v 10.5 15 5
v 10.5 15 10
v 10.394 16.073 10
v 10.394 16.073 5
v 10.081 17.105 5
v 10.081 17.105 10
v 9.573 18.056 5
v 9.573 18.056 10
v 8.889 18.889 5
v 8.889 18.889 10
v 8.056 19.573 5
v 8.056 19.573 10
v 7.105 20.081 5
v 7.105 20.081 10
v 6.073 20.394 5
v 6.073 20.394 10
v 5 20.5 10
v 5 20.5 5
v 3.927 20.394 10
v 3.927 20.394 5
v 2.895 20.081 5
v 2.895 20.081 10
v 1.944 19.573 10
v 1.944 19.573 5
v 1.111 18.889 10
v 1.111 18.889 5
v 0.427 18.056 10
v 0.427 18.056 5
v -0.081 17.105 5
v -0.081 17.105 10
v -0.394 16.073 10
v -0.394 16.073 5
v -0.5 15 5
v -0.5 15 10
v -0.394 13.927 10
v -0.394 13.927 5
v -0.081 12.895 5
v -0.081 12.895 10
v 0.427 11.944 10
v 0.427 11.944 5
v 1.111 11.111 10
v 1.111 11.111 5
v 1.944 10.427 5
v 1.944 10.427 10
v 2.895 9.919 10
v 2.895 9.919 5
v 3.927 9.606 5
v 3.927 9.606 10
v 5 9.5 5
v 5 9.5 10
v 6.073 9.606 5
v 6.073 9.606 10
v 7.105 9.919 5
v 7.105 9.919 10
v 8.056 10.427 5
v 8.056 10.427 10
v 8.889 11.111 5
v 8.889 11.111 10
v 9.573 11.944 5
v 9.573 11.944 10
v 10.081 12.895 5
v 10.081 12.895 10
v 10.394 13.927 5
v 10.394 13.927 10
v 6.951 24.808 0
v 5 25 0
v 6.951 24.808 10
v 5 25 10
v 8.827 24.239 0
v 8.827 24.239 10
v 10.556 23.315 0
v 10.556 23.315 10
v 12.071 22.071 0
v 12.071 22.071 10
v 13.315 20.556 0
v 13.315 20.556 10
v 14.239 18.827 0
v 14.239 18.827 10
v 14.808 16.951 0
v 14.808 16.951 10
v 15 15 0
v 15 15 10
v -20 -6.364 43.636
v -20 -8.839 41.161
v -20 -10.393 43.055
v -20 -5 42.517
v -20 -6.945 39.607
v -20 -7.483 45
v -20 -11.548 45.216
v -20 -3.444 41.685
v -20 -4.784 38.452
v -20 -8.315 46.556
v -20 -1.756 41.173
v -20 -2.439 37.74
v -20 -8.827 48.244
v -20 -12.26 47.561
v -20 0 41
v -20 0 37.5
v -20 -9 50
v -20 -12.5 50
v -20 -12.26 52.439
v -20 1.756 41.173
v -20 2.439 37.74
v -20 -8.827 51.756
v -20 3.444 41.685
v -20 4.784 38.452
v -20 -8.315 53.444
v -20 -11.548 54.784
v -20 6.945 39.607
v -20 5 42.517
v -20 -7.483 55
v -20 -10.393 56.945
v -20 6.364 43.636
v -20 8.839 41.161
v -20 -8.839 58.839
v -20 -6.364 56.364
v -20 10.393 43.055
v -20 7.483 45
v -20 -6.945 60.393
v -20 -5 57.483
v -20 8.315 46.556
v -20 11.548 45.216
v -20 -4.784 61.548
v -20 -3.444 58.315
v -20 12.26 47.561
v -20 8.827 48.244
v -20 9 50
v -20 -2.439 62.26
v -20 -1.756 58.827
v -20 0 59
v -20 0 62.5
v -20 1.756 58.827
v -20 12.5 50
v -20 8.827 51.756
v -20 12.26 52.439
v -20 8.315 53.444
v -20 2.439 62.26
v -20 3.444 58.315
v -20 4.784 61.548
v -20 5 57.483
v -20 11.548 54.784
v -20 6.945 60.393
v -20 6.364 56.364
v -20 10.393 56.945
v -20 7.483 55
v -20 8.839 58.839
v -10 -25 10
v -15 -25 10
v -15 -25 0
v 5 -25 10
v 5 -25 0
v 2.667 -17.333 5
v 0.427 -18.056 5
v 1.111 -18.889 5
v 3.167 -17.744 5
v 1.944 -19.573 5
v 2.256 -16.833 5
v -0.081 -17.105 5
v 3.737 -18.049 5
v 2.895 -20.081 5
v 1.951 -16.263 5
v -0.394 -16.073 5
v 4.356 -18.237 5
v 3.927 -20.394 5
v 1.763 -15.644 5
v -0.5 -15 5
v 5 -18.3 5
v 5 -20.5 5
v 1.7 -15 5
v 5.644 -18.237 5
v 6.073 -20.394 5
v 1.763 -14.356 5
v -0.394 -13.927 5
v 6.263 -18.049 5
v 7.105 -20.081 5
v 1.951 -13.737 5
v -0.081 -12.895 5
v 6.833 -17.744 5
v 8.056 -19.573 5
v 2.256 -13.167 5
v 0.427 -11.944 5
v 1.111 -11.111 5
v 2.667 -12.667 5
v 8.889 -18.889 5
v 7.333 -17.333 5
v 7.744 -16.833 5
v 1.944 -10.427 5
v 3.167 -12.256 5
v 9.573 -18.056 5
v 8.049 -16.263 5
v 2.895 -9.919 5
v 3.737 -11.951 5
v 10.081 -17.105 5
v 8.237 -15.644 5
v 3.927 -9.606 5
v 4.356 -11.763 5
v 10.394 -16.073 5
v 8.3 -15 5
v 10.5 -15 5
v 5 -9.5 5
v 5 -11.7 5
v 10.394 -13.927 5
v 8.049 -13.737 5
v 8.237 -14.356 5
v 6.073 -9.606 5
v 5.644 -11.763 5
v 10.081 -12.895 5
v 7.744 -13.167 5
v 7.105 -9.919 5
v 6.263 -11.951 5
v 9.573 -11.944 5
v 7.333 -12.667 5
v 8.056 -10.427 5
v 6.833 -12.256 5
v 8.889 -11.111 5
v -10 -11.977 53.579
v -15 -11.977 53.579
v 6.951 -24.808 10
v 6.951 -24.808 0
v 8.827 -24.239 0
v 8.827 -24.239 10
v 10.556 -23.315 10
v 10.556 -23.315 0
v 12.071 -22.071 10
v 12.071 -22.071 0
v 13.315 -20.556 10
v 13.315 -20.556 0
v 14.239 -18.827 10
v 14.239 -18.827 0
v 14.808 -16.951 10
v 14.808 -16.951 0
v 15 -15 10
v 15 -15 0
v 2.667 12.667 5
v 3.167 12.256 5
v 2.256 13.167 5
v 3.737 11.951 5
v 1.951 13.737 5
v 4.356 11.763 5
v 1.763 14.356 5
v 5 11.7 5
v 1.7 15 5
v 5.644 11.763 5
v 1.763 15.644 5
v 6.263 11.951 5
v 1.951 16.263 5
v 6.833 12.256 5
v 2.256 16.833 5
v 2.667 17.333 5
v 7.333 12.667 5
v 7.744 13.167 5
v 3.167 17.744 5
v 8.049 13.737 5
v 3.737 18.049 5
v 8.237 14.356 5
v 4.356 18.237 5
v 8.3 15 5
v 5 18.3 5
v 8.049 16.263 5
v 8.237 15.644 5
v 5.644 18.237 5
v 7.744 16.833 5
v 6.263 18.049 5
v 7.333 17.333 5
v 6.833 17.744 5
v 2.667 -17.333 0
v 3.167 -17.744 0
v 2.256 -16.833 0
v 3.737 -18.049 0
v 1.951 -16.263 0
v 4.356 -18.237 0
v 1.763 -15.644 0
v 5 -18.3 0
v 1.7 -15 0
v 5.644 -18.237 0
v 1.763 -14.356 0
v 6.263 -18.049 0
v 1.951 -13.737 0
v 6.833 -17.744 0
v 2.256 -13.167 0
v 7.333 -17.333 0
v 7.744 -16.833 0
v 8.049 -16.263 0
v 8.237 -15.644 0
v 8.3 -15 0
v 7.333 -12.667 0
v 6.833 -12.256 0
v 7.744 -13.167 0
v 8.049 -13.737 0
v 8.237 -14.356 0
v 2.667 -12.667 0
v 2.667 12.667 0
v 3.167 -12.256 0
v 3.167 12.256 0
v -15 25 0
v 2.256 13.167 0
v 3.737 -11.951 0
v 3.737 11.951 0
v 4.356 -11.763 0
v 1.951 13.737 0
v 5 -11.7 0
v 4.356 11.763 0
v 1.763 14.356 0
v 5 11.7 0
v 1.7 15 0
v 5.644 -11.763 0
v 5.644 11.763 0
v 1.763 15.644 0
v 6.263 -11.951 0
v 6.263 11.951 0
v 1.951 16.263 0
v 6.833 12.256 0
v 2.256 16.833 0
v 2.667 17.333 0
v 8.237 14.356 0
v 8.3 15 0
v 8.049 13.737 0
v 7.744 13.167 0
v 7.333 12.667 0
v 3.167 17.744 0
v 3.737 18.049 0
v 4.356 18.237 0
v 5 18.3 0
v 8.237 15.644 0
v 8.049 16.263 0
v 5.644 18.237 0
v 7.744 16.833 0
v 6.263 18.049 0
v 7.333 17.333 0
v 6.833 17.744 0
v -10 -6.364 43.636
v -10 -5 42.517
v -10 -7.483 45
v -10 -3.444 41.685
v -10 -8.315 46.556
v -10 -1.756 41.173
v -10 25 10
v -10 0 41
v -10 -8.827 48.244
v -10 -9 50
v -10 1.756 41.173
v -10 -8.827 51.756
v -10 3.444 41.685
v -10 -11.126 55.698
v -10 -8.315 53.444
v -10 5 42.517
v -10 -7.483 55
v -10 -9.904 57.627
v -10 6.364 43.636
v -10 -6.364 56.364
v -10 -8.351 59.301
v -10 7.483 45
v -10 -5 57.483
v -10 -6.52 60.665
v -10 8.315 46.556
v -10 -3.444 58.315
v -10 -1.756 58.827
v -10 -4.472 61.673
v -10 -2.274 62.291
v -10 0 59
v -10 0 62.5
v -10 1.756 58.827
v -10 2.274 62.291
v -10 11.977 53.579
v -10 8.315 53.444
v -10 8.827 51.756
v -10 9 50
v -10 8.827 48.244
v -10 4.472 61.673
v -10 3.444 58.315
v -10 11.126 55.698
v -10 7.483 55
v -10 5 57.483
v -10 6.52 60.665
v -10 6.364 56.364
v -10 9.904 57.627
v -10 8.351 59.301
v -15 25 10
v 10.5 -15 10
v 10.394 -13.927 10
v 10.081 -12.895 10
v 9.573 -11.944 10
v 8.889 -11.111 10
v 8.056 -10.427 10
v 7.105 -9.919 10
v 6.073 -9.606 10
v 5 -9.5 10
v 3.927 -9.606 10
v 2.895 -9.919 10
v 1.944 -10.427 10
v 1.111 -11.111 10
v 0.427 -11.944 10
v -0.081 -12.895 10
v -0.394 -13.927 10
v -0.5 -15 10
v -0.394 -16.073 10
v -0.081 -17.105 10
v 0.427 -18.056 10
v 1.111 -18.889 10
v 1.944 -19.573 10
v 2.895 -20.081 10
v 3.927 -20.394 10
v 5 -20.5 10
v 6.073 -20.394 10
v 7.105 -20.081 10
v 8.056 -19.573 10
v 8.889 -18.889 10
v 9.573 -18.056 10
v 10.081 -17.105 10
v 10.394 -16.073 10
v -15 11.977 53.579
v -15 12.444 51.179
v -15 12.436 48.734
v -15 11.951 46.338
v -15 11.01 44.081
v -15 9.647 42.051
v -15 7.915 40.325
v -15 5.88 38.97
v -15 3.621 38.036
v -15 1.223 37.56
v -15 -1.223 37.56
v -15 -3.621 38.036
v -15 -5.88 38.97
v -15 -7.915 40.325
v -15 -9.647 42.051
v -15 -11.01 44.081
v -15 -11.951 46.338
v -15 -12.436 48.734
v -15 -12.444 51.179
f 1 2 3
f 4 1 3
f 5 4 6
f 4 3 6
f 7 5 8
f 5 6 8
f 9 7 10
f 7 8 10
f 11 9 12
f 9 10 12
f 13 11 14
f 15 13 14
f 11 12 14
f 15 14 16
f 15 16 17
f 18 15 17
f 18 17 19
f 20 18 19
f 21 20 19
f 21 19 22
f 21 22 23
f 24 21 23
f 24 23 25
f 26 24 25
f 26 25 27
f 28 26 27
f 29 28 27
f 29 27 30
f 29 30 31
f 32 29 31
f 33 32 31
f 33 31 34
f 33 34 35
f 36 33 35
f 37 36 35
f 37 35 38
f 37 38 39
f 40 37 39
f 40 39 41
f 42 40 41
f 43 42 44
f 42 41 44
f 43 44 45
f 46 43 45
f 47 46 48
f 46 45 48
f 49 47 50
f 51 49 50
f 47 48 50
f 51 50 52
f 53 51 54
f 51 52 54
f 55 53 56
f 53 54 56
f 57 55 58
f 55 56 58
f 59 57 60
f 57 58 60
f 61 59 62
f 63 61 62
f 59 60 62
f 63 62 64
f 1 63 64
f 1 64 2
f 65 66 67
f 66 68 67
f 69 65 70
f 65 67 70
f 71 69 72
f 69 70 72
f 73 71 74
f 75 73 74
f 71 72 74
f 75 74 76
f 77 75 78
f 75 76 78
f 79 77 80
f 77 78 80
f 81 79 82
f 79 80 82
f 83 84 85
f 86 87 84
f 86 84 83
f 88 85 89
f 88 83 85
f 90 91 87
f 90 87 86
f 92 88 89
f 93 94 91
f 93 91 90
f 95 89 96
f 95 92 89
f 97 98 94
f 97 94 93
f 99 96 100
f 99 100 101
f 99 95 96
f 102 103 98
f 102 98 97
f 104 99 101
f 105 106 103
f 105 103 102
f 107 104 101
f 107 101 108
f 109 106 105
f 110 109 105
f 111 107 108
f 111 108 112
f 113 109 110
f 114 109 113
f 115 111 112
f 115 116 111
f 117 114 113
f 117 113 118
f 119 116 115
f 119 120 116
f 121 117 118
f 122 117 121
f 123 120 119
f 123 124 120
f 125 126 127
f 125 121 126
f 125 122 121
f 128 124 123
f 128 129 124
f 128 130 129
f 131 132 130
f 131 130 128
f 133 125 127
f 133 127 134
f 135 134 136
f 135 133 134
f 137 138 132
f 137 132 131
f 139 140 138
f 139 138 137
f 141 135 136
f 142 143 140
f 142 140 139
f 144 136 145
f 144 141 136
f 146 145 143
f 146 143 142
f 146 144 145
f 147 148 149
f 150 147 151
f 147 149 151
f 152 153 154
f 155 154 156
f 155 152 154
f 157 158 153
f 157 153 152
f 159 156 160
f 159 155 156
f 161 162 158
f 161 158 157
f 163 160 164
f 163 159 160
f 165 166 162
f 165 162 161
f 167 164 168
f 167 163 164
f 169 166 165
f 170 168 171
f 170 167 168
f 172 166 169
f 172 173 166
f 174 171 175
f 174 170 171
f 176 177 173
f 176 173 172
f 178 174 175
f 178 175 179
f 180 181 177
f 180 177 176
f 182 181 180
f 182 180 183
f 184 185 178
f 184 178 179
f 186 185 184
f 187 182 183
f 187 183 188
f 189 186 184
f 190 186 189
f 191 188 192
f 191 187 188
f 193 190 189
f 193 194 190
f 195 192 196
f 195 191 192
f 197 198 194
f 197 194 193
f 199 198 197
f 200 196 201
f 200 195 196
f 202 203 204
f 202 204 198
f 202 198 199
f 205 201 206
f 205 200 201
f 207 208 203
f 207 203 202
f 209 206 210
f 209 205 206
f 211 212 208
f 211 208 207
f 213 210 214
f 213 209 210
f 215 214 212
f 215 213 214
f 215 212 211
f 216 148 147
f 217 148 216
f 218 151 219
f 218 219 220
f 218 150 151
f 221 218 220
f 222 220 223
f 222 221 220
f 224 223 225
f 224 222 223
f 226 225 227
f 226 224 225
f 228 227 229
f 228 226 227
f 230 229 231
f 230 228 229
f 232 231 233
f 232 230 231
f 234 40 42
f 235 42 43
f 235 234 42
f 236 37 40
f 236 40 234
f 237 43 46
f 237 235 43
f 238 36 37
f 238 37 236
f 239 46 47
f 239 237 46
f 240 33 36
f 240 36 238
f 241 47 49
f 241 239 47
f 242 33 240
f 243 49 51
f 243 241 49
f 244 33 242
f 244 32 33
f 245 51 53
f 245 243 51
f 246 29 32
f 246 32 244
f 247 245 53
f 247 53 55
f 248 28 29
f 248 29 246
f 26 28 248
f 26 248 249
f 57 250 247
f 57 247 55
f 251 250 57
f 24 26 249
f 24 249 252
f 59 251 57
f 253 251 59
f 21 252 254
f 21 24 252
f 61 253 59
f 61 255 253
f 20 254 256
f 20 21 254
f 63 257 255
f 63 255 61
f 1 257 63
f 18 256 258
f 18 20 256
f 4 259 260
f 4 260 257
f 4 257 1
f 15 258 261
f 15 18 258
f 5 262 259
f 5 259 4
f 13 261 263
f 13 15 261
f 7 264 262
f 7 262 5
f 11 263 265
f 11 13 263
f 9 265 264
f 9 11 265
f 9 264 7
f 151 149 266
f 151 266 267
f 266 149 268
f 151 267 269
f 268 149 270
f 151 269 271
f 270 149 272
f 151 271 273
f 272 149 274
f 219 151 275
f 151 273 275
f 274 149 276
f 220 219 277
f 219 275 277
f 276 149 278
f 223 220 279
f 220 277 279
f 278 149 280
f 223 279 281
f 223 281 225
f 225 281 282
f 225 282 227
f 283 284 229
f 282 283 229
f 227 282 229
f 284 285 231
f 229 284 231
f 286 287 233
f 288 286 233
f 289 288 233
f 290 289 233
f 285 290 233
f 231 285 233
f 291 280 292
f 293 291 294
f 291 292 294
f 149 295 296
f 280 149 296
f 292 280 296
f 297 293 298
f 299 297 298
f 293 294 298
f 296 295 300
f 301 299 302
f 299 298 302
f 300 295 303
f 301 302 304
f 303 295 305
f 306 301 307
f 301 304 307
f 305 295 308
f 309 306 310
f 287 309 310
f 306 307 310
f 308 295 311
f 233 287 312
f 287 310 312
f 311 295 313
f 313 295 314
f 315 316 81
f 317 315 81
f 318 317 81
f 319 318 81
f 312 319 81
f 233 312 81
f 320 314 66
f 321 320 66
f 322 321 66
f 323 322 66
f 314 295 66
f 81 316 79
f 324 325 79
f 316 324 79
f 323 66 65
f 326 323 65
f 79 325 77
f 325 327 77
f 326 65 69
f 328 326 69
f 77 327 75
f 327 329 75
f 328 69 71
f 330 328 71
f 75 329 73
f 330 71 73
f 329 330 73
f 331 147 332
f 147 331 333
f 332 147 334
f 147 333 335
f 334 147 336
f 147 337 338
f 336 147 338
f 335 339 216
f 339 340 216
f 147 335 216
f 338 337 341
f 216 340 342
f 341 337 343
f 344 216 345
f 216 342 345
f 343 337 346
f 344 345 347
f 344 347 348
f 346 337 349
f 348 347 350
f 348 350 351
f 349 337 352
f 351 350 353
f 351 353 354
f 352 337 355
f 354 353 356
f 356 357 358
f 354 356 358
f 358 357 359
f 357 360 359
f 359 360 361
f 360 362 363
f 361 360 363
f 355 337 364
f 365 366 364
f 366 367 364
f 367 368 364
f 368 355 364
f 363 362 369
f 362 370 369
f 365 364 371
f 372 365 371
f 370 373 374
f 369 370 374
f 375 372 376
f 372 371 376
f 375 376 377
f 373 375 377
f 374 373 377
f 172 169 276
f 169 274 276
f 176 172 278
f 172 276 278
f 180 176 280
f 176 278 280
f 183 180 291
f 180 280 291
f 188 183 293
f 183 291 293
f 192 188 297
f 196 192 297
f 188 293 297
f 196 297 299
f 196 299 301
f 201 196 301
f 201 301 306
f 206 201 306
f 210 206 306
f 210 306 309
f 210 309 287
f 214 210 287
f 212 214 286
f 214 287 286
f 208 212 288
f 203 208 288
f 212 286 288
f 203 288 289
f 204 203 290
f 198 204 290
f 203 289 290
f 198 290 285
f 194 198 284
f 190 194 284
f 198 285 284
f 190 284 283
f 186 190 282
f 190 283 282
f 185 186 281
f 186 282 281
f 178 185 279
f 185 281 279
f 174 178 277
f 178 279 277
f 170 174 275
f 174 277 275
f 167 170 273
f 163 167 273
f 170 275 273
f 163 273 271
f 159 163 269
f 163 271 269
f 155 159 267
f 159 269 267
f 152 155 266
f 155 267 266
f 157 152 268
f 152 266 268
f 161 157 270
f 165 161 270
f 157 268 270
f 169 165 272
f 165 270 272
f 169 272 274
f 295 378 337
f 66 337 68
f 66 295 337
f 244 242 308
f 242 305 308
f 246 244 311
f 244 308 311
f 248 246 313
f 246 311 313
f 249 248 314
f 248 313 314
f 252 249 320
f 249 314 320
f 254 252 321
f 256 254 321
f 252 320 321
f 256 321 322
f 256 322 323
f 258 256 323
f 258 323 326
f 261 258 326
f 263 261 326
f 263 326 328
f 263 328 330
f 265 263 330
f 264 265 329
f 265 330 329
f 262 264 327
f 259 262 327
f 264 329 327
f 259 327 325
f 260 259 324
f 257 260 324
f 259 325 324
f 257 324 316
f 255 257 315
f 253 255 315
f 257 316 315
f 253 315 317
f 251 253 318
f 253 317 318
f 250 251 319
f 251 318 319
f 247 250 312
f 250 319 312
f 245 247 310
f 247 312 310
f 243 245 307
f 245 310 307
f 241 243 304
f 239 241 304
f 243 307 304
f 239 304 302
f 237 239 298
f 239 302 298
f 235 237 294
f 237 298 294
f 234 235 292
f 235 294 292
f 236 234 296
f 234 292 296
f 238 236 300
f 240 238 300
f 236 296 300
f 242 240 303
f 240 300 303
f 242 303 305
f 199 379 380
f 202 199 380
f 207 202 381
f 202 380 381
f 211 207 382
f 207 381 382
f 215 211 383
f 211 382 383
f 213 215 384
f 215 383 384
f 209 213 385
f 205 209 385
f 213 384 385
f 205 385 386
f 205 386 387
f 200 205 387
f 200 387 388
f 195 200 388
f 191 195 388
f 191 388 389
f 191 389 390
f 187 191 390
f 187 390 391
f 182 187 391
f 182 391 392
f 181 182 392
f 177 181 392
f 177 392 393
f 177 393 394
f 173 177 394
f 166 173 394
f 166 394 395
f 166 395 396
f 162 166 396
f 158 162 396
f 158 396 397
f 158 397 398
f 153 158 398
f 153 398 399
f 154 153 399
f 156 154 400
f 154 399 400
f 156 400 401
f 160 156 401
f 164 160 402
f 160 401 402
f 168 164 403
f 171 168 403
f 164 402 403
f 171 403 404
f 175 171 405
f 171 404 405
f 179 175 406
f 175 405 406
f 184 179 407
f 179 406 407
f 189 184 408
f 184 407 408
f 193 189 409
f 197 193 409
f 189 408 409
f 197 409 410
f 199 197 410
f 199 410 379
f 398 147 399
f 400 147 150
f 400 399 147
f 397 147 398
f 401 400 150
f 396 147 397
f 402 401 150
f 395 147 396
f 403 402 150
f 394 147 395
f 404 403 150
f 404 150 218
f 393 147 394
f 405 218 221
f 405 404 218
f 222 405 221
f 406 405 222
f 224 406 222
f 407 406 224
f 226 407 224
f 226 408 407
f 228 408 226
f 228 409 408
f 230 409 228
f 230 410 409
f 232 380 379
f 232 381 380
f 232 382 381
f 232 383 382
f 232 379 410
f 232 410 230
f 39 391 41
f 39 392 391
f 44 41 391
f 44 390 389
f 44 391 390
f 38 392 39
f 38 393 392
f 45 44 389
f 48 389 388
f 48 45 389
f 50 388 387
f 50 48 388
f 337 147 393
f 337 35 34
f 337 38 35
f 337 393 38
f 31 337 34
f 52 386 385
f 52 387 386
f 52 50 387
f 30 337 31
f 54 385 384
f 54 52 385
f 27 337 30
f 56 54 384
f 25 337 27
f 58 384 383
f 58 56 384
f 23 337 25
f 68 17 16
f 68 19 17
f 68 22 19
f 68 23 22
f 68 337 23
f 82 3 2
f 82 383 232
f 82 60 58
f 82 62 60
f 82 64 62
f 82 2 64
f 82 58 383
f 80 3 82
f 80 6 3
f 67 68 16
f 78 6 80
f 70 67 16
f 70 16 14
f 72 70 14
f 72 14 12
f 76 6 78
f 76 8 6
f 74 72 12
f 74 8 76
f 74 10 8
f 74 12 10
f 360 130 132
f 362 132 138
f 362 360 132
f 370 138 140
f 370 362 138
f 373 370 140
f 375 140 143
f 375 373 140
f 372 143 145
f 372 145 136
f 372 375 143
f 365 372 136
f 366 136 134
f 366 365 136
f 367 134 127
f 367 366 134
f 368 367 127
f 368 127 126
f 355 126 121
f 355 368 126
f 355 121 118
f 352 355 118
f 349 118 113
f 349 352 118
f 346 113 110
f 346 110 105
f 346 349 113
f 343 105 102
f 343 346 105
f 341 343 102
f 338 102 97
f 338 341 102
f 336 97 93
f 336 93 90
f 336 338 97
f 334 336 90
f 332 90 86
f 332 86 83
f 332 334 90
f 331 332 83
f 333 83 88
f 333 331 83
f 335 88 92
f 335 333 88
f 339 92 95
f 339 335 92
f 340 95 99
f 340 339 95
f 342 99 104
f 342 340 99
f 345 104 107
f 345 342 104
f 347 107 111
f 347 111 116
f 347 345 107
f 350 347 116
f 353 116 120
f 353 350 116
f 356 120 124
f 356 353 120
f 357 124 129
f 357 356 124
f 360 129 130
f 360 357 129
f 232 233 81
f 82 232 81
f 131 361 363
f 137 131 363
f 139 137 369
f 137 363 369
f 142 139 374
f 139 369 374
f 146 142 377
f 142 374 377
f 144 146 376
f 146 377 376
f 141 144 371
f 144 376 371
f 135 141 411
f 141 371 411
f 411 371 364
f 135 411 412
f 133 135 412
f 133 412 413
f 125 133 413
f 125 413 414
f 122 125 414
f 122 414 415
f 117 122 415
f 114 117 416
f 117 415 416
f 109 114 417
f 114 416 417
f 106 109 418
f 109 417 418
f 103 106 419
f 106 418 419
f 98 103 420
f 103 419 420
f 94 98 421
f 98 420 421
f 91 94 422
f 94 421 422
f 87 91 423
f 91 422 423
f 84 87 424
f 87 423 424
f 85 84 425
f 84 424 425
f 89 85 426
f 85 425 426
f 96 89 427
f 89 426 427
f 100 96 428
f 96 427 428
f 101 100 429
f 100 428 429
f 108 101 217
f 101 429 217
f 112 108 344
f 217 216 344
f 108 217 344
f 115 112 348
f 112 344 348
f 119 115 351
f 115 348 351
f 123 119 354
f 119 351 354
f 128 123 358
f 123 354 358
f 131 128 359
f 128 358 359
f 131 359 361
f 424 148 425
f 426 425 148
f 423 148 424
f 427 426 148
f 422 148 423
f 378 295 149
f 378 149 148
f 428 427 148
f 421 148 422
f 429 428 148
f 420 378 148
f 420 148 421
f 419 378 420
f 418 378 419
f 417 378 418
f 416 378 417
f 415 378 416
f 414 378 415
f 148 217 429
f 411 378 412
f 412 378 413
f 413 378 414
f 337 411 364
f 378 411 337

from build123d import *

# Parameters (mm, degrees)
SKETCH_1_W                = 30
SKETCH_1_H                = 50
EXTRUDE_2_DEPTH           = 10
EXTRUDE_3_DEPTH           = 5
EXTRUDE_4_DEPTH           = 5
EXTRUDE_4_DEPTH_BACK      = 5
SKETCH_2_3_R              = 9
FILLET_1_R                = 10
HOLE_WIZARD_1_D           = 6.6
HOLE_WIZARD_1_CBORE_D     = 11
HOLE_WIZARD_1_CBORE_DEPTH = 5


with BuildPart() as part:
    # 草图1 → 凸台-拉伸2 (new body)
    with BuildSketch(Plane.XY):
        Rectangle(SKETCH_1_W, SKETCH_1_H)
    extrude(amount=EXTRUDE_2_DEPTH)

    # 草图2 → 凸台-拉伸3 (add)
    with BuildSketch(Plane.ZY.offset(15)):
        with BuildLine():
            Line((10, 25), (10, -25))
            Line((10, -25), (53.579145154, -11.976632246))
            ThreePointArc((53.579145154, -11.976632246), (37.5, 0), (53.579145154, 11.976632246))
            Line((53.579145154, 11.976632246), (10, 25))
        make_face()
    extrude(amount=-EXTRUDE_3_DEPTH)

    # 草图2<3> → 凸台-拉伸4 (add, two sides: drawn at the far end of the back side and taken through both)
    with BuildSketch(Plane.ZY.offset(15).offset(-EXTRUDE_4_DEPTH_BACK)):
        with BuildLine():
            ThreePointArc((53.579145154, -11.976632246), (60.02470235, -7.466950032), (62.5, 0))
            ThreePointArc((62.5, 0), (60.02470235, 7.466950032), (53.579145154, 11.976632246))
            ThreePointArc((53.579145154, 11.976632246), (37.5, 0), (53.579145154, -11.976632246))
        make_face()
        with Locations((50, 0)):
            Circle(SKETCH_2_3_R, mode=Mode.SUBTRACT)
    extrude(amount=EXTRUDE_4_DEPTH + EXTRUDE_4_DEPTH_BACK)

    # 圆角1
    fillet_1_edges = [part.edges().sort_by_distance(p)[0] for p in [
        (15, 25, 5),
        (15, -25, 5),
    ]]
    fillet(fillet_1_edges, radius=FILLET_1_R)

    # 打孔尺寸(%根据)内六角圆柱头螺钉的类型1 (through all)
    with Locations(Plane.XY.offset(10)):
        with Locations((5, -15), (5, 15)):
            CounterBoreHole(HOLE_WIZARD_1_D / 2, HOLE_WIZARD_1_CBORE_D / 2, HOLE_WIZARD_1_CBORE_DEPTH)


solid = part.part
